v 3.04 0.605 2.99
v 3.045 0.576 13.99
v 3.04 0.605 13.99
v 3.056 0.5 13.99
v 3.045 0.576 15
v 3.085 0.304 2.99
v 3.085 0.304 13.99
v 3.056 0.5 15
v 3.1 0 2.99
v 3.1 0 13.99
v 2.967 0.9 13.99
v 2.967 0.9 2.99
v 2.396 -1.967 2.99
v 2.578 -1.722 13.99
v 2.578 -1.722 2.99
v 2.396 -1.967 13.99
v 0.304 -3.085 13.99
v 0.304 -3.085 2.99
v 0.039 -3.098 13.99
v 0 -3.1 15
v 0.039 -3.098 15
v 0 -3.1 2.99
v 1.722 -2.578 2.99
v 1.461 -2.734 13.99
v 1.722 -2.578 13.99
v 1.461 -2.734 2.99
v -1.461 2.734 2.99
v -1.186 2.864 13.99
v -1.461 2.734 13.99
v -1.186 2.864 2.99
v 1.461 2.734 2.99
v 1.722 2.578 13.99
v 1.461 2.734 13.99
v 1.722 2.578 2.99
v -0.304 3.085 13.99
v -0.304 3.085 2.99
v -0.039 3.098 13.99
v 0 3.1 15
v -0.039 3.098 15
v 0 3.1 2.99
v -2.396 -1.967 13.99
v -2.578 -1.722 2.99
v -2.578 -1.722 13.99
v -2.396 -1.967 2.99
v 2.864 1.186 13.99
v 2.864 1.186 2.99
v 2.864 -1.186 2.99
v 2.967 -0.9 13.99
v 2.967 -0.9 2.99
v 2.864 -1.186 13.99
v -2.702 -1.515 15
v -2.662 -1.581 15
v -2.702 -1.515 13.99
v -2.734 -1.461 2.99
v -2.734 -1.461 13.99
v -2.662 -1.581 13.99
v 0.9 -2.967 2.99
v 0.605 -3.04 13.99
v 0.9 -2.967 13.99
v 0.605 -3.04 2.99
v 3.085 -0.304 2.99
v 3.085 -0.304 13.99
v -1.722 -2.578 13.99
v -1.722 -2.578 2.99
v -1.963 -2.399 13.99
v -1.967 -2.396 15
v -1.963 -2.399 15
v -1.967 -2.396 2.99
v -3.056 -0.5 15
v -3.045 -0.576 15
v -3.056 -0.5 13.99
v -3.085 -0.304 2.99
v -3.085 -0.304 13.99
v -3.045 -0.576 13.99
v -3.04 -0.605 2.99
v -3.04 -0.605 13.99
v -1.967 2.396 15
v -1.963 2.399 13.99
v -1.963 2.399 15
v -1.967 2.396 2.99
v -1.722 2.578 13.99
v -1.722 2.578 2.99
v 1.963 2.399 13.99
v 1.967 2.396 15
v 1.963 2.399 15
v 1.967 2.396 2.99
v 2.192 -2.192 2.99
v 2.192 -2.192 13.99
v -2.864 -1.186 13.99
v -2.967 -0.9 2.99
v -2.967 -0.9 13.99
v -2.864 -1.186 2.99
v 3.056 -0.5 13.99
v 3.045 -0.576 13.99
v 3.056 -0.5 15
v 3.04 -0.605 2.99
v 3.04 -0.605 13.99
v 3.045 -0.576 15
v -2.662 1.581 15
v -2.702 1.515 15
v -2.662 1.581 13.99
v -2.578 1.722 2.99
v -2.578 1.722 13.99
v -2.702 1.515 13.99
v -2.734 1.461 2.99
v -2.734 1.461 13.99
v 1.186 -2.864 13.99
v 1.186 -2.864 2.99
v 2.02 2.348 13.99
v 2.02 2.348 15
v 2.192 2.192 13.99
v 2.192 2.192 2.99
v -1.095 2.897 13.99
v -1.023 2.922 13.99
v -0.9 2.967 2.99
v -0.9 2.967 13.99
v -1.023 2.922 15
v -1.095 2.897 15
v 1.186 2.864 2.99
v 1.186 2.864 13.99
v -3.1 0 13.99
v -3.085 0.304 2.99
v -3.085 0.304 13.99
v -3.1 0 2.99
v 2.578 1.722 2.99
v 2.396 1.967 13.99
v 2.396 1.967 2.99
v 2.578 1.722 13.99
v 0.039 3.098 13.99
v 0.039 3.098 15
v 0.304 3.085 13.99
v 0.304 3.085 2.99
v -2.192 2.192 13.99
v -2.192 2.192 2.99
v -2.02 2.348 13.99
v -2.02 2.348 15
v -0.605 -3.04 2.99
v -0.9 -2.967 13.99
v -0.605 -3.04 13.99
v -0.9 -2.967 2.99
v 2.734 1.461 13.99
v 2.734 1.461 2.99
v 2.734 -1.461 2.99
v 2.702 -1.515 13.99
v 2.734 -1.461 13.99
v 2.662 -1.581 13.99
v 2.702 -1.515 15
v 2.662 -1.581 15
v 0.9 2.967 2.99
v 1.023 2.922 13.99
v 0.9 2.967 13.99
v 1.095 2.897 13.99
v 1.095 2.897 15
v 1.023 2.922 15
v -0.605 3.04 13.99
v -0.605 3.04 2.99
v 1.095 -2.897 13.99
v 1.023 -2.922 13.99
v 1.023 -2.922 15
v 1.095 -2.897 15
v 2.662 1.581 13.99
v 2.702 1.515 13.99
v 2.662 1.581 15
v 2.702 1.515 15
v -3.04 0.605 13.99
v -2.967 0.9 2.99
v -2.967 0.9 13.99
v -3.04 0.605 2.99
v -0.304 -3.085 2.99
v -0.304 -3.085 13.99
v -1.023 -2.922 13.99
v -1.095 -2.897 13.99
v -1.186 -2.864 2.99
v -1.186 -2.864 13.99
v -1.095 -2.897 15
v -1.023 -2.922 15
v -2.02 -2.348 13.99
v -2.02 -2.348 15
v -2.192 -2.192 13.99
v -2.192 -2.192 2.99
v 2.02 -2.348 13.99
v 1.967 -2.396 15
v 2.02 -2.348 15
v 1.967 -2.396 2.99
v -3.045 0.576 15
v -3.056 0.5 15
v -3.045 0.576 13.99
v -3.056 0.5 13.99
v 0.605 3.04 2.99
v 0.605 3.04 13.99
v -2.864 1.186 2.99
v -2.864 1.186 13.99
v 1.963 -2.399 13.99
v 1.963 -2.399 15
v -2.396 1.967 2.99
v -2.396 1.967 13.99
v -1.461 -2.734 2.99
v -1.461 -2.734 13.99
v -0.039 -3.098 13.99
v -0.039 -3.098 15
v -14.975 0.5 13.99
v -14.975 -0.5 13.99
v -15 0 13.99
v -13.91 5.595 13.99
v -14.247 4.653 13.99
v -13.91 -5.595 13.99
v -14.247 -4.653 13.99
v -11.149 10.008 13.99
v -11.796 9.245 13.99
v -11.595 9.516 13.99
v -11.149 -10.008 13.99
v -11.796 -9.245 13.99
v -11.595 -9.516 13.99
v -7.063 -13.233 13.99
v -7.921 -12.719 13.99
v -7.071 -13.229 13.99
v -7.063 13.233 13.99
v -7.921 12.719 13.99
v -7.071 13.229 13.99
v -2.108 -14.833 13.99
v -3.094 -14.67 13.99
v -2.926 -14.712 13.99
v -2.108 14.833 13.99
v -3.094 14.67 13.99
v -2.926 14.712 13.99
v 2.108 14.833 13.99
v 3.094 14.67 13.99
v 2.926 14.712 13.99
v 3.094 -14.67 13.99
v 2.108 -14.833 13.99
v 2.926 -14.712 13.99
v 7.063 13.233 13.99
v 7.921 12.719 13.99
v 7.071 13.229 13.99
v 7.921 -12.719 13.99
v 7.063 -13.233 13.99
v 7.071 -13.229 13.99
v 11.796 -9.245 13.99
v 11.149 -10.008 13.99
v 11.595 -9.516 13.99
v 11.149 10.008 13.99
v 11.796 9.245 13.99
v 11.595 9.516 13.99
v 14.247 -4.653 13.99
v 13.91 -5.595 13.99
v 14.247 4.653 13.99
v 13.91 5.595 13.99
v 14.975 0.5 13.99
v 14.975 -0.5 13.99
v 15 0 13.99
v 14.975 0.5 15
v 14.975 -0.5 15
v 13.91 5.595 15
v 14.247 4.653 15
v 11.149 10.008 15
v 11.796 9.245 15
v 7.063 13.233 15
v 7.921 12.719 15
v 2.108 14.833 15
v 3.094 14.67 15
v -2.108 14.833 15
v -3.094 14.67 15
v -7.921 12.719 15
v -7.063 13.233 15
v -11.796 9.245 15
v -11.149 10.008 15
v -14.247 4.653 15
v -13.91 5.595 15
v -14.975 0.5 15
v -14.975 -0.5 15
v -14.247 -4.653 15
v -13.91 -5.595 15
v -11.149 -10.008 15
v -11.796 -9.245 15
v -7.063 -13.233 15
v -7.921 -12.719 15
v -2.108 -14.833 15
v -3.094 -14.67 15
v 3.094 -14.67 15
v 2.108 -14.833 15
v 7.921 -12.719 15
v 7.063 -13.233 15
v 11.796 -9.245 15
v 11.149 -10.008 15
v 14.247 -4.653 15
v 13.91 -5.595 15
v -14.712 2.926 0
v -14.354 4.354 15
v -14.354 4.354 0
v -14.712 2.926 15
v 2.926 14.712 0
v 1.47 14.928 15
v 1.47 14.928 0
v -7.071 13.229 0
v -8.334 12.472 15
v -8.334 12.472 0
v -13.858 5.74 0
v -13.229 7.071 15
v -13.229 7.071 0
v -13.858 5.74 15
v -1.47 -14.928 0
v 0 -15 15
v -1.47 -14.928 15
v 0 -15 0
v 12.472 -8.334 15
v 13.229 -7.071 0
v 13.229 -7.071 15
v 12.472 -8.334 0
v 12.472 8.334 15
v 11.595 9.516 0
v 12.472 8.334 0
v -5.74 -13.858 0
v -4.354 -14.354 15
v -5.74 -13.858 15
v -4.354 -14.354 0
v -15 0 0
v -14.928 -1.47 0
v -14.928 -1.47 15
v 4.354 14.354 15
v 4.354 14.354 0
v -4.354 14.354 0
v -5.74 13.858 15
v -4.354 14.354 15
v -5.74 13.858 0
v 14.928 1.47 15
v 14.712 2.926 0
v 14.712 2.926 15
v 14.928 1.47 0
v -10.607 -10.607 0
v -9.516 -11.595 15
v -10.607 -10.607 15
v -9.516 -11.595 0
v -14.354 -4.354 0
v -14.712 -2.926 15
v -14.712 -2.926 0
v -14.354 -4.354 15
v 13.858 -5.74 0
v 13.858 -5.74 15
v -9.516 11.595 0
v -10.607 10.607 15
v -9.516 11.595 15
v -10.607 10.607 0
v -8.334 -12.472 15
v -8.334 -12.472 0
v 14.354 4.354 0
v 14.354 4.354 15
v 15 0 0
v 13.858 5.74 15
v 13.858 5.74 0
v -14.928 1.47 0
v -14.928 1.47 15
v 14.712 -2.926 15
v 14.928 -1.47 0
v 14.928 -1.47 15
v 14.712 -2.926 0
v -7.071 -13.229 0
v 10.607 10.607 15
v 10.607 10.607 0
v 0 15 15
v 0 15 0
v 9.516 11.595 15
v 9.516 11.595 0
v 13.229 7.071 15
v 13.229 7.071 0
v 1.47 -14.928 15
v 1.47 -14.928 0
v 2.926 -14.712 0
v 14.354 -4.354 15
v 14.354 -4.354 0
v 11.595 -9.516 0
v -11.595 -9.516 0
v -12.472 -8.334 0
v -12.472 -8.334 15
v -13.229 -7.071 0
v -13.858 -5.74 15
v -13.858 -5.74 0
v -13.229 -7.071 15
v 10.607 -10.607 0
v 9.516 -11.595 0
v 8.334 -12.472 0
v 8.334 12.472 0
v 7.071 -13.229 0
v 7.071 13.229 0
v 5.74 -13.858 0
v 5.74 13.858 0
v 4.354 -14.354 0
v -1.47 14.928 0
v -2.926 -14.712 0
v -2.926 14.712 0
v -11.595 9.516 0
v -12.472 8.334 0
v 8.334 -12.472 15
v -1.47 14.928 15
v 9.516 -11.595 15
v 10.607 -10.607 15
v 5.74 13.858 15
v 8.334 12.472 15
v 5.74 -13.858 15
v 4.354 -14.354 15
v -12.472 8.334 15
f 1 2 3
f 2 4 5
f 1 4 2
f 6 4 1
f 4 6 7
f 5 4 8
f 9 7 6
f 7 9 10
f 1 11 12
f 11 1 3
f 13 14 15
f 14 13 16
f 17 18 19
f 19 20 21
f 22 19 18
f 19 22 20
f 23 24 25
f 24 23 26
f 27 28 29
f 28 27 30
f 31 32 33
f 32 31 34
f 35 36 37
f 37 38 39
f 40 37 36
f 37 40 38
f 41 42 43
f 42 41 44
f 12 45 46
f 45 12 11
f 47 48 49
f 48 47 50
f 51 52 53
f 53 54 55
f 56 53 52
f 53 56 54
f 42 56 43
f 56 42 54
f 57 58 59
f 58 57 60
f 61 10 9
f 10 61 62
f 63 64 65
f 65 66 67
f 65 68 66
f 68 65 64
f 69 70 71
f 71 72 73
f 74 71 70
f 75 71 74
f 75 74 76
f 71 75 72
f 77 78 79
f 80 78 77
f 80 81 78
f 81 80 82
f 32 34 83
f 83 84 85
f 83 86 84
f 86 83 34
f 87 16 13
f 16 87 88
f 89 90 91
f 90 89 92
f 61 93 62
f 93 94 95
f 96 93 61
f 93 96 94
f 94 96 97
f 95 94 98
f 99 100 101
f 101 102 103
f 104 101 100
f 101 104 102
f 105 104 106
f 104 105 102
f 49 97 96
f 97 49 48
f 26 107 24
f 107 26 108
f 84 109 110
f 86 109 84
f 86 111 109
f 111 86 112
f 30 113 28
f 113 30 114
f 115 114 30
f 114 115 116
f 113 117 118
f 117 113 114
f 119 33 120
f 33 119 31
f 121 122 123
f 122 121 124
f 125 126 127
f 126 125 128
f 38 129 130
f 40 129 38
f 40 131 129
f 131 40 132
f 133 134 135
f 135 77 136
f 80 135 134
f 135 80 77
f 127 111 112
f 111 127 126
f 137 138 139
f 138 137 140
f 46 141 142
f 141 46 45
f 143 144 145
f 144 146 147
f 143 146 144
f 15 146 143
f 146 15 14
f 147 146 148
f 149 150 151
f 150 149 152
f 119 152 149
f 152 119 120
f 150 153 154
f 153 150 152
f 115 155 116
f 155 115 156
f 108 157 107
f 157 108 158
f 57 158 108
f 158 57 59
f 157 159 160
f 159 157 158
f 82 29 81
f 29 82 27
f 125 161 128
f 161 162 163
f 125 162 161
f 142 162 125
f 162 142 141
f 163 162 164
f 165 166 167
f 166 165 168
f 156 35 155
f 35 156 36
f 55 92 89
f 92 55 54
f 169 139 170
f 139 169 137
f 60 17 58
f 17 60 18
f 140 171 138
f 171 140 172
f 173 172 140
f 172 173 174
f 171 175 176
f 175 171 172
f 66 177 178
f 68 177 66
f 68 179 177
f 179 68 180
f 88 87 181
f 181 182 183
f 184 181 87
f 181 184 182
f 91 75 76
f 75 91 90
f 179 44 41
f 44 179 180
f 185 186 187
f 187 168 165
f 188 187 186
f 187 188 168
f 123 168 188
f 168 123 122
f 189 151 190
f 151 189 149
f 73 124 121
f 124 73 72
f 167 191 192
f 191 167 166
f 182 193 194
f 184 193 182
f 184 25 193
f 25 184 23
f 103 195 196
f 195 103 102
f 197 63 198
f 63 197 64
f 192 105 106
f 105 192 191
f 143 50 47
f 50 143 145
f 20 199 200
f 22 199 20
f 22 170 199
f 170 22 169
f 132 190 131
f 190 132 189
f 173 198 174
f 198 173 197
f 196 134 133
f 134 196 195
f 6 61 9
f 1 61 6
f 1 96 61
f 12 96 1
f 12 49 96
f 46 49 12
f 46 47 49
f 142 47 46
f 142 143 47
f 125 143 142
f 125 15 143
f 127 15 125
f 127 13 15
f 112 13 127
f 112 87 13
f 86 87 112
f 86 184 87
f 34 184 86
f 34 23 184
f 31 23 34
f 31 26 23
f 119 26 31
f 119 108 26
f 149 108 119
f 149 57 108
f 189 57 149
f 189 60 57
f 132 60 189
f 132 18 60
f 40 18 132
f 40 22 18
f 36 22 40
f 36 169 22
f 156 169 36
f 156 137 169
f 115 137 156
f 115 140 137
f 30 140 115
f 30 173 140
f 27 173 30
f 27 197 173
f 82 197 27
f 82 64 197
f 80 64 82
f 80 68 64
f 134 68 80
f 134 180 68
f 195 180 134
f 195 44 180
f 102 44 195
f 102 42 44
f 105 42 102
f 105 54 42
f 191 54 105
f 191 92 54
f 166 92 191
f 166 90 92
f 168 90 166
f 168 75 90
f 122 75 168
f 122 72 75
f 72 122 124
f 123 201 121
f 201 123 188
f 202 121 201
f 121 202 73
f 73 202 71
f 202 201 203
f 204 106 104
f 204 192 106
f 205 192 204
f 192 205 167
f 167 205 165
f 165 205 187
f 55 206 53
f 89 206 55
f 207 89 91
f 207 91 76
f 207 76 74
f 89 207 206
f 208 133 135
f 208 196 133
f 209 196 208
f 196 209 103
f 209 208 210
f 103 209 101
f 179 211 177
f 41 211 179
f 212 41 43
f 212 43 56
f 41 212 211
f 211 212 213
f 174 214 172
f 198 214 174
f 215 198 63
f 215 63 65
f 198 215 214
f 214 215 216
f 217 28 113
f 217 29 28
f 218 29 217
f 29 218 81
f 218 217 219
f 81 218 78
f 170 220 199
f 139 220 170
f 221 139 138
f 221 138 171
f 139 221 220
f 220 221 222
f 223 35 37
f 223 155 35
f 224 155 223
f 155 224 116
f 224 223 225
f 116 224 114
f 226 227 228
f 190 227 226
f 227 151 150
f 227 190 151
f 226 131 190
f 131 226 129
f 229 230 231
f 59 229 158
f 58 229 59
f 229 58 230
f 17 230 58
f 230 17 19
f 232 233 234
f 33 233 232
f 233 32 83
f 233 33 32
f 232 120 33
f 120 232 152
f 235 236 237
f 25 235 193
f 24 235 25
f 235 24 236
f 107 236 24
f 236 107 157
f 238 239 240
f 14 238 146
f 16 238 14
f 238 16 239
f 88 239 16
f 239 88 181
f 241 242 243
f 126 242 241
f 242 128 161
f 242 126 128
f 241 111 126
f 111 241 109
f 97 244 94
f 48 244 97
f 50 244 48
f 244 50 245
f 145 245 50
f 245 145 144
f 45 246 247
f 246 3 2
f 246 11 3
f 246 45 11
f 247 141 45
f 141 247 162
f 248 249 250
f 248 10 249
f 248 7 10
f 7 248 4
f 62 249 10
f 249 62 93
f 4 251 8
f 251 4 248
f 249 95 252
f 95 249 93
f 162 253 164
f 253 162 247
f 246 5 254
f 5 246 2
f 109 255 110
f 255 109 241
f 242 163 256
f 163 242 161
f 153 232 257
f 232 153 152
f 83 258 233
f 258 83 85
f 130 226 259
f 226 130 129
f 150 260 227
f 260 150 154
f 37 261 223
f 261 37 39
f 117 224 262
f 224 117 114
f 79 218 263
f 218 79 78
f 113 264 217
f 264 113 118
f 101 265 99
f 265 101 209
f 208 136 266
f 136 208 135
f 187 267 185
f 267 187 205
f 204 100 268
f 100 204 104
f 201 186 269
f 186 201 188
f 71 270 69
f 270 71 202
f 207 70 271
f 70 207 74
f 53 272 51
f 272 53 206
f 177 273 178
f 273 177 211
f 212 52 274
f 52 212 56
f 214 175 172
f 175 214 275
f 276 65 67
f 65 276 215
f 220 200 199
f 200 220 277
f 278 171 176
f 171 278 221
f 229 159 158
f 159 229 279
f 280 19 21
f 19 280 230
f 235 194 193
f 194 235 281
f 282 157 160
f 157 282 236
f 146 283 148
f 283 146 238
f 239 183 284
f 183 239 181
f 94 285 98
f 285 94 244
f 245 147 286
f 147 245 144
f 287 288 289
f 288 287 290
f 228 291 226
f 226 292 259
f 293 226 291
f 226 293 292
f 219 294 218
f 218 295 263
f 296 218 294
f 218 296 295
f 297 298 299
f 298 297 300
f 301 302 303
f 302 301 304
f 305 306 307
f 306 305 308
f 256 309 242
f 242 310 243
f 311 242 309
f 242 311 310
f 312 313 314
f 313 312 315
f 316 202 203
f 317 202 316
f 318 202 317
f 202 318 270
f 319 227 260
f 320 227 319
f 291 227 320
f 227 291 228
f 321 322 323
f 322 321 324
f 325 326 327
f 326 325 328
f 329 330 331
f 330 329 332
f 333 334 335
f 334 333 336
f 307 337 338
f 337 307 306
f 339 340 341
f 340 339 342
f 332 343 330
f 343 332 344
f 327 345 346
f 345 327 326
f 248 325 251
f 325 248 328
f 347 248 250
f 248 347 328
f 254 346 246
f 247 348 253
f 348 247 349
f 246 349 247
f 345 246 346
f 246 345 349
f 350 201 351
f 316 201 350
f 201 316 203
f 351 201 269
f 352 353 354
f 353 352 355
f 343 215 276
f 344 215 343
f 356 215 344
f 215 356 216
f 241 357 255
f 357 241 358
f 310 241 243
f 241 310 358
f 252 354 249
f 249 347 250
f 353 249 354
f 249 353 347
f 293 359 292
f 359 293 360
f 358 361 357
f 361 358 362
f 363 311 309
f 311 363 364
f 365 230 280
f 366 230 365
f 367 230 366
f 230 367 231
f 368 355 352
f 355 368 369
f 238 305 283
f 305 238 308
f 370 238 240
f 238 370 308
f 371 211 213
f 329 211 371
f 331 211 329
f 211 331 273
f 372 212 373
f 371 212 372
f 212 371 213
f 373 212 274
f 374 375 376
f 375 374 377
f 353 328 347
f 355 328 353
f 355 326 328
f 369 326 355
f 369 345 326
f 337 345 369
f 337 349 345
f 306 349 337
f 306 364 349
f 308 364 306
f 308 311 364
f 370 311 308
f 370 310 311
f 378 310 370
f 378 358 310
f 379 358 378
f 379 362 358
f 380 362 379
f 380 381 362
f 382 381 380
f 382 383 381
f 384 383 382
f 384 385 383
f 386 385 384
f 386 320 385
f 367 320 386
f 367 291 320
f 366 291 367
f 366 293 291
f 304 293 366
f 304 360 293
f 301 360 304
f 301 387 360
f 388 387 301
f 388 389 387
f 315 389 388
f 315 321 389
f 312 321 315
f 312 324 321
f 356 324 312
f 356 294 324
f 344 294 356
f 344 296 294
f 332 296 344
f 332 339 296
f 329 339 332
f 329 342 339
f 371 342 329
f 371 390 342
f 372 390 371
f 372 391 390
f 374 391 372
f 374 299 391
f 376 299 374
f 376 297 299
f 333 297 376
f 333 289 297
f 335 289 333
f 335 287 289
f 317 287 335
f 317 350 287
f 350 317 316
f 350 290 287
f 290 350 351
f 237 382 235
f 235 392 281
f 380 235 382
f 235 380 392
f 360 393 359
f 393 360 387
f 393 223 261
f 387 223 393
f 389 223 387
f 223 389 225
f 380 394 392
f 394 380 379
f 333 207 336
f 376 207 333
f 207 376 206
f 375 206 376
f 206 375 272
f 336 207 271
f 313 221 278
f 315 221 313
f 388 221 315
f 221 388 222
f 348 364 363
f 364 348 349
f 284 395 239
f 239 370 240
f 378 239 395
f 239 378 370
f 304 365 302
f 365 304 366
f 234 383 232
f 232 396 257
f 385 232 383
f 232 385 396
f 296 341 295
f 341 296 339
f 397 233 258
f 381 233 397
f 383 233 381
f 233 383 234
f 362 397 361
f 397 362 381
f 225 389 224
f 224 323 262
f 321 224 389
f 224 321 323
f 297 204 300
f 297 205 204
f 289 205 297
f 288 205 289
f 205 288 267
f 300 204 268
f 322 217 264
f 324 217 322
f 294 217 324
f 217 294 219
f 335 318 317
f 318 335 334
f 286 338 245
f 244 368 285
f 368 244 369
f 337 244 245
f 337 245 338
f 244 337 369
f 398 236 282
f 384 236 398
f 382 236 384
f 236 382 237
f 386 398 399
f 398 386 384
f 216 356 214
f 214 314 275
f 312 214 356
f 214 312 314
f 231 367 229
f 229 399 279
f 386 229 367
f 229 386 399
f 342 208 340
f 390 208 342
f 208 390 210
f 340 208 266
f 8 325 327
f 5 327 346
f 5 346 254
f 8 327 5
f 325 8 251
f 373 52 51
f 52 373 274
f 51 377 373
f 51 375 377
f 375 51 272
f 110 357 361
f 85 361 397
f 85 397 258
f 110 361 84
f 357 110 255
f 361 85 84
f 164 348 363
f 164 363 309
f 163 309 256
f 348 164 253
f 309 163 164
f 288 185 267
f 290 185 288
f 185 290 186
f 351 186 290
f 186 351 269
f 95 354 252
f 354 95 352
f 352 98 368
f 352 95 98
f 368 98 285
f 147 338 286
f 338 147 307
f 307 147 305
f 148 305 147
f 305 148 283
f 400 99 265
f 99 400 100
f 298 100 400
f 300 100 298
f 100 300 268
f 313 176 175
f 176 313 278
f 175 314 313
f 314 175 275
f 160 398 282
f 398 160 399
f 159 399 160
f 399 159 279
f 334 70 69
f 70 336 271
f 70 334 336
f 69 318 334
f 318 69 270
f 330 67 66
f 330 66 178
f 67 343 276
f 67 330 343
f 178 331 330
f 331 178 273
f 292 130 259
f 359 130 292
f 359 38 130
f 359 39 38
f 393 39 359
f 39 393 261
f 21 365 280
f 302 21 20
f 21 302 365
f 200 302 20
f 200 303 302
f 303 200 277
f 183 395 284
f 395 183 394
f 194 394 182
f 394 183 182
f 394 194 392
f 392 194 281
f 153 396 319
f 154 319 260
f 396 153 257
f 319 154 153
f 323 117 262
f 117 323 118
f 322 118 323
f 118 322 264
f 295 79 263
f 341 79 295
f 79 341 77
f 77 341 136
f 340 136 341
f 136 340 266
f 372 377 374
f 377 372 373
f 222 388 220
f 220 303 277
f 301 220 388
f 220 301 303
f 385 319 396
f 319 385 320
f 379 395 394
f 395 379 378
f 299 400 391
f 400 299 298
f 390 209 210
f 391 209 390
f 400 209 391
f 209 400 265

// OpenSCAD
// Built by bench/smallmodels/features/compiler.py from a list of features.
$fn = 64;
difference() {
  union() {
    translate([0, 0, 0]) cylinder(d = 30, h = 15);
  }
  union() {
    translate([0, 0, 2.99]) rotate([0, 0, 0]) cylinder(d = 6.2, h = 12.02);
    translate([15, 0, 13.99]) rotate([0, 0, 0]) translate([-15, -0.5, 0]) cube([30, 1, 1.02]);
    translate([14.0954, 5.1303, 13.99]) rotate([0, 0, 20]) translate([-15, -0.5, 0]) cube([30, 1, 1.02]);
    translate([11.4907, 9.6418, 13.99]) rotate([0, 0, 40]) translate([-15, -0.5, 0]) cube([30, 1, 1.02]);
    translate([7.5, 12.9904, 13.99]) rotate([0, 0, 60]) translate([-15, -0.5, 0]) cube([30, 1, 1.02]);
    translate([2.6047, 14.7721, 13.99]) rotate([0, 0, 80]) translate([-15, -0.5, 0]) cube([30, 1, 1.02]);
    translate([-2.6047, 14.7721, 13.99]) rotate([0, 0, 100]) translate([-15, -0.5, 0]) cube([30, 1, 1.02]);
    translate([-7.5, 12.9904, 13.99]) rotate([0, 0, 120]) translate([-15, -0.5, 0]) cube([30, 1, 1.02]);
    translate([-11.4907, 9.6418, 13.99]) rotate([0, 0, 140]) translate([-15, -0.5, 0]) cube([30, 1, 1.02]);
    translate([-14.0954, 5.1303, 13.99]) rotate([0, 0, 160]) translate([-15, -0.5, 0]) cube([30, 1, 1.02]);
    translate([-15, 0, 13.99]) rotate([0, 0, 180]) translate([-15, -0.5, 0]) cube([30, 1, 1.02]);
    translate([-14.0954, -5.1303, 13.99]) rotate([0, 0, 200]) translate([-15, -0.5, 0]) cube([30, 1, 1.02]);
    translate([-11.4907, -9.6418, 13.99]) rotate([0, 0, 220]) translate([-15, -0.5, 0]) cube([30, 1, 1.02]);
    translate([-7.5, -12.9904, 13.99]) rotate([0, 0, 240]) translate([-15, -0.5, 0]) cube([30, 1, 1.02]);
    translate([-2.6047, -14.7721, 13.99]) rotate([0, 0, 260]) translate([-15, -0.5, 0]) cube([30, 1, 1.02]);
    translate([2.6047, -14.7721, 13.99]) rotate([0, 0, 280]) translate([-15, -0.5, 0]) cube([30, 1, 1.02]);
    translate([7.5, -12.9904, 13.99]) rotate([0, 0, 300]) translate([-15, -0.5, 0]) cube([30, 1, 1.02]);
    translate([11.4907, -9.6418, 13.99]) rotate([0, 0, 320]) translate([-15, -0.5, 0]) cube([30, 1, 1.02]);
    translate([14.0954, -5.1303, 13.99]) rotate([0, 0, 340]) translate([-15, -0.5, 0]) cube([30, 1, 1.02]);
  }
}
